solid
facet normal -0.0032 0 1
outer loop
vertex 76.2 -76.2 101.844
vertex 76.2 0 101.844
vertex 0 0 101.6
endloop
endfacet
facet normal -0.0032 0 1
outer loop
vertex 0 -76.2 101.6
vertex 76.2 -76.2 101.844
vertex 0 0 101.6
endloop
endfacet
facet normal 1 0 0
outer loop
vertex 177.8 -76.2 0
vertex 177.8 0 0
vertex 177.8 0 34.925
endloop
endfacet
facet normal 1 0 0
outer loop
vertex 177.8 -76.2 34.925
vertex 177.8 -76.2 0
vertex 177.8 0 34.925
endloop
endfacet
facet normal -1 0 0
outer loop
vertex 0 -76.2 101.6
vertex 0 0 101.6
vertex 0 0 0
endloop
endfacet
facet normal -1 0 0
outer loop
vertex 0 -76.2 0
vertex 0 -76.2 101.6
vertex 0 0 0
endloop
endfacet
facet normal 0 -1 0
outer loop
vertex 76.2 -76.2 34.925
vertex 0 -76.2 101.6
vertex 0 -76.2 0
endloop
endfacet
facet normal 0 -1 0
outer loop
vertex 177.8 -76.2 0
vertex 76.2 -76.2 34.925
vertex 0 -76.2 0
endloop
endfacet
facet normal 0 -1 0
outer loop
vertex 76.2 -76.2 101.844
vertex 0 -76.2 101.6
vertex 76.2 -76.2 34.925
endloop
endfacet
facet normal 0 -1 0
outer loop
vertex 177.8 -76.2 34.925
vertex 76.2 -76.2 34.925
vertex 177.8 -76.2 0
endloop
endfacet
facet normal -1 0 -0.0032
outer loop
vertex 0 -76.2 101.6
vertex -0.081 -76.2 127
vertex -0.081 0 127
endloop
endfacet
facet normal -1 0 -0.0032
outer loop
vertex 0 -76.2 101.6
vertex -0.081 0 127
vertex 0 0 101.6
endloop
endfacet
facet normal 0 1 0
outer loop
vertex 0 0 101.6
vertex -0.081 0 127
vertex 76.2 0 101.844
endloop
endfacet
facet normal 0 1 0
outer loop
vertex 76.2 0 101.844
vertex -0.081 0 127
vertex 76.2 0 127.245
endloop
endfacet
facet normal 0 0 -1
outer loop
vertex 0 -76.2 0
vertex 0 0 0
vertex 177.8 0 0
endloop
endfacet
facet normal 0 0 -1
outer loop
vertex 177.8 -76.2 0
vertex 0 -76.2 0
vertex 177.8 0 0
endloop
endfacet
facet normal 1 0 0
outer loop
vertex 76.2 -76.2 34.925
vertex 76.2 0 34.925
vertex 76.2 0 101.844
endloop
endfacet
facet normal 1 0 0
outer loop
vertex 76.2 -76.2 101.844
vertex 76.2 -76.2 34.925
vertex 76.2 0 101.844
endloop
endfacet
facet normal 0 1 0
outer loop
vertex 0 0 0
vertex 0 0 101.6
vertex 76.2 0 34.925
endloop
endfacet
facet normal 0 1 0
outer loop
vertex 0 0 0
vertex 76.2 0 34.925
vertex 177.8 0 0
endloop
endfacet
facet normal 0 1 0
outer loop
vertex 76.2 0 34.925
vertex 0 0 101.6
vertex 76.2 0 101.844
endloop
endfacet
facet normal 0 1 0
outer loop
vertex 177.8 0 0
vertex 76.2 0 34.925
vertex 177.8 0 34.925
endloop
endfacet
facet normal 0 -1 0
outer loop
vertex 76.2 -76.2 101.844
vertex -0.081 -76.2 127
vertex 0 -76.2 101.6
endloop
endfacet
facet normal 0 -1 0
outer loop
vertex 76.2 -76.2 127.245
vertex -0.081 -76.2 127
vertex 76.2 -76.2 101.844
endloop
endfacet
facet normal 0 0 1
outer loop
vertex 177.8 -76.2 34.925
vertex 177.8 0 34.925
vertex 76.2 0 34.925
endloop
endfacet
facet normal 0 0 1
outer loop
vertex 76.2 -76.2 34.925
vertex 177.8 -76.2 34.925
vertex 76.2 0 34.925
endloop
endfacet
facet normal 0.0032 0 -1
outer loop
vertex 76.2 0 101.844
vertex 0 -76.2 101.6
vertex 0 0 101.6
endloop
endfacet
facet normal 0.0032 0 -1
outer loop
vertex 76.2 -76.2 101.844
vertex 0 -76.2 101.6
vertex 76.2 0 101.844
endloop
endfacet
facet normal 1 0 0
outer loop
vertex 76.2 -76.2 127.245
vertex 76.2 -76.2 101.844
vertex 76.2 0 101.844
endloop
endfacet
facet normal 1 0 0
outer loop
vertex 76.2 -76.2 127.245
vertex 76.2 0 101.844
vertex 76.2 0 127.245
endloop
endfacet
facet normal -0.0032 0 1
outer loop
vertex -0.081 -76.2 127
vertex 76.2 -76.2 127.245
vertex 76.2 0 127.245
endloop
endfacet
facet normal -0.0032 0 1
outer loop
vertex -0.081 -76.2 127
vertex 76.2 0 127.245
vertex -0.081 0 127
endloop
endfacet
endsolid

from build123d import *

# Parameters (mm, degrees)
F1_DEPTH = 76.2
F3_DEPTH = 76.2


with BuildPart() as f1:
    # F0 (on Front) → F1 (new body)
    with BuildSketch(Plane.XZ):
        Polygon((0, 101.6), (0, 0), (177.8, 0), (177.8, 34.925), (76.2, 34.925), (76.2, 101.844475), align=None)
    extrude(amount=F1_DEPTH)


with BuildPart() as f3:
    # F2 (on face) → F3 (new body)
    with BuildSketch(Plane.XZ.offset(76.2)):
        Polygon((-0.081491, 126.999869), (0, 101.6), (76.2, 101.844475), (76.2, 127.244605), align=None)
    extrude(amount=-F3_DEPTH)


solid = Compound([f1.part, f3.part])
